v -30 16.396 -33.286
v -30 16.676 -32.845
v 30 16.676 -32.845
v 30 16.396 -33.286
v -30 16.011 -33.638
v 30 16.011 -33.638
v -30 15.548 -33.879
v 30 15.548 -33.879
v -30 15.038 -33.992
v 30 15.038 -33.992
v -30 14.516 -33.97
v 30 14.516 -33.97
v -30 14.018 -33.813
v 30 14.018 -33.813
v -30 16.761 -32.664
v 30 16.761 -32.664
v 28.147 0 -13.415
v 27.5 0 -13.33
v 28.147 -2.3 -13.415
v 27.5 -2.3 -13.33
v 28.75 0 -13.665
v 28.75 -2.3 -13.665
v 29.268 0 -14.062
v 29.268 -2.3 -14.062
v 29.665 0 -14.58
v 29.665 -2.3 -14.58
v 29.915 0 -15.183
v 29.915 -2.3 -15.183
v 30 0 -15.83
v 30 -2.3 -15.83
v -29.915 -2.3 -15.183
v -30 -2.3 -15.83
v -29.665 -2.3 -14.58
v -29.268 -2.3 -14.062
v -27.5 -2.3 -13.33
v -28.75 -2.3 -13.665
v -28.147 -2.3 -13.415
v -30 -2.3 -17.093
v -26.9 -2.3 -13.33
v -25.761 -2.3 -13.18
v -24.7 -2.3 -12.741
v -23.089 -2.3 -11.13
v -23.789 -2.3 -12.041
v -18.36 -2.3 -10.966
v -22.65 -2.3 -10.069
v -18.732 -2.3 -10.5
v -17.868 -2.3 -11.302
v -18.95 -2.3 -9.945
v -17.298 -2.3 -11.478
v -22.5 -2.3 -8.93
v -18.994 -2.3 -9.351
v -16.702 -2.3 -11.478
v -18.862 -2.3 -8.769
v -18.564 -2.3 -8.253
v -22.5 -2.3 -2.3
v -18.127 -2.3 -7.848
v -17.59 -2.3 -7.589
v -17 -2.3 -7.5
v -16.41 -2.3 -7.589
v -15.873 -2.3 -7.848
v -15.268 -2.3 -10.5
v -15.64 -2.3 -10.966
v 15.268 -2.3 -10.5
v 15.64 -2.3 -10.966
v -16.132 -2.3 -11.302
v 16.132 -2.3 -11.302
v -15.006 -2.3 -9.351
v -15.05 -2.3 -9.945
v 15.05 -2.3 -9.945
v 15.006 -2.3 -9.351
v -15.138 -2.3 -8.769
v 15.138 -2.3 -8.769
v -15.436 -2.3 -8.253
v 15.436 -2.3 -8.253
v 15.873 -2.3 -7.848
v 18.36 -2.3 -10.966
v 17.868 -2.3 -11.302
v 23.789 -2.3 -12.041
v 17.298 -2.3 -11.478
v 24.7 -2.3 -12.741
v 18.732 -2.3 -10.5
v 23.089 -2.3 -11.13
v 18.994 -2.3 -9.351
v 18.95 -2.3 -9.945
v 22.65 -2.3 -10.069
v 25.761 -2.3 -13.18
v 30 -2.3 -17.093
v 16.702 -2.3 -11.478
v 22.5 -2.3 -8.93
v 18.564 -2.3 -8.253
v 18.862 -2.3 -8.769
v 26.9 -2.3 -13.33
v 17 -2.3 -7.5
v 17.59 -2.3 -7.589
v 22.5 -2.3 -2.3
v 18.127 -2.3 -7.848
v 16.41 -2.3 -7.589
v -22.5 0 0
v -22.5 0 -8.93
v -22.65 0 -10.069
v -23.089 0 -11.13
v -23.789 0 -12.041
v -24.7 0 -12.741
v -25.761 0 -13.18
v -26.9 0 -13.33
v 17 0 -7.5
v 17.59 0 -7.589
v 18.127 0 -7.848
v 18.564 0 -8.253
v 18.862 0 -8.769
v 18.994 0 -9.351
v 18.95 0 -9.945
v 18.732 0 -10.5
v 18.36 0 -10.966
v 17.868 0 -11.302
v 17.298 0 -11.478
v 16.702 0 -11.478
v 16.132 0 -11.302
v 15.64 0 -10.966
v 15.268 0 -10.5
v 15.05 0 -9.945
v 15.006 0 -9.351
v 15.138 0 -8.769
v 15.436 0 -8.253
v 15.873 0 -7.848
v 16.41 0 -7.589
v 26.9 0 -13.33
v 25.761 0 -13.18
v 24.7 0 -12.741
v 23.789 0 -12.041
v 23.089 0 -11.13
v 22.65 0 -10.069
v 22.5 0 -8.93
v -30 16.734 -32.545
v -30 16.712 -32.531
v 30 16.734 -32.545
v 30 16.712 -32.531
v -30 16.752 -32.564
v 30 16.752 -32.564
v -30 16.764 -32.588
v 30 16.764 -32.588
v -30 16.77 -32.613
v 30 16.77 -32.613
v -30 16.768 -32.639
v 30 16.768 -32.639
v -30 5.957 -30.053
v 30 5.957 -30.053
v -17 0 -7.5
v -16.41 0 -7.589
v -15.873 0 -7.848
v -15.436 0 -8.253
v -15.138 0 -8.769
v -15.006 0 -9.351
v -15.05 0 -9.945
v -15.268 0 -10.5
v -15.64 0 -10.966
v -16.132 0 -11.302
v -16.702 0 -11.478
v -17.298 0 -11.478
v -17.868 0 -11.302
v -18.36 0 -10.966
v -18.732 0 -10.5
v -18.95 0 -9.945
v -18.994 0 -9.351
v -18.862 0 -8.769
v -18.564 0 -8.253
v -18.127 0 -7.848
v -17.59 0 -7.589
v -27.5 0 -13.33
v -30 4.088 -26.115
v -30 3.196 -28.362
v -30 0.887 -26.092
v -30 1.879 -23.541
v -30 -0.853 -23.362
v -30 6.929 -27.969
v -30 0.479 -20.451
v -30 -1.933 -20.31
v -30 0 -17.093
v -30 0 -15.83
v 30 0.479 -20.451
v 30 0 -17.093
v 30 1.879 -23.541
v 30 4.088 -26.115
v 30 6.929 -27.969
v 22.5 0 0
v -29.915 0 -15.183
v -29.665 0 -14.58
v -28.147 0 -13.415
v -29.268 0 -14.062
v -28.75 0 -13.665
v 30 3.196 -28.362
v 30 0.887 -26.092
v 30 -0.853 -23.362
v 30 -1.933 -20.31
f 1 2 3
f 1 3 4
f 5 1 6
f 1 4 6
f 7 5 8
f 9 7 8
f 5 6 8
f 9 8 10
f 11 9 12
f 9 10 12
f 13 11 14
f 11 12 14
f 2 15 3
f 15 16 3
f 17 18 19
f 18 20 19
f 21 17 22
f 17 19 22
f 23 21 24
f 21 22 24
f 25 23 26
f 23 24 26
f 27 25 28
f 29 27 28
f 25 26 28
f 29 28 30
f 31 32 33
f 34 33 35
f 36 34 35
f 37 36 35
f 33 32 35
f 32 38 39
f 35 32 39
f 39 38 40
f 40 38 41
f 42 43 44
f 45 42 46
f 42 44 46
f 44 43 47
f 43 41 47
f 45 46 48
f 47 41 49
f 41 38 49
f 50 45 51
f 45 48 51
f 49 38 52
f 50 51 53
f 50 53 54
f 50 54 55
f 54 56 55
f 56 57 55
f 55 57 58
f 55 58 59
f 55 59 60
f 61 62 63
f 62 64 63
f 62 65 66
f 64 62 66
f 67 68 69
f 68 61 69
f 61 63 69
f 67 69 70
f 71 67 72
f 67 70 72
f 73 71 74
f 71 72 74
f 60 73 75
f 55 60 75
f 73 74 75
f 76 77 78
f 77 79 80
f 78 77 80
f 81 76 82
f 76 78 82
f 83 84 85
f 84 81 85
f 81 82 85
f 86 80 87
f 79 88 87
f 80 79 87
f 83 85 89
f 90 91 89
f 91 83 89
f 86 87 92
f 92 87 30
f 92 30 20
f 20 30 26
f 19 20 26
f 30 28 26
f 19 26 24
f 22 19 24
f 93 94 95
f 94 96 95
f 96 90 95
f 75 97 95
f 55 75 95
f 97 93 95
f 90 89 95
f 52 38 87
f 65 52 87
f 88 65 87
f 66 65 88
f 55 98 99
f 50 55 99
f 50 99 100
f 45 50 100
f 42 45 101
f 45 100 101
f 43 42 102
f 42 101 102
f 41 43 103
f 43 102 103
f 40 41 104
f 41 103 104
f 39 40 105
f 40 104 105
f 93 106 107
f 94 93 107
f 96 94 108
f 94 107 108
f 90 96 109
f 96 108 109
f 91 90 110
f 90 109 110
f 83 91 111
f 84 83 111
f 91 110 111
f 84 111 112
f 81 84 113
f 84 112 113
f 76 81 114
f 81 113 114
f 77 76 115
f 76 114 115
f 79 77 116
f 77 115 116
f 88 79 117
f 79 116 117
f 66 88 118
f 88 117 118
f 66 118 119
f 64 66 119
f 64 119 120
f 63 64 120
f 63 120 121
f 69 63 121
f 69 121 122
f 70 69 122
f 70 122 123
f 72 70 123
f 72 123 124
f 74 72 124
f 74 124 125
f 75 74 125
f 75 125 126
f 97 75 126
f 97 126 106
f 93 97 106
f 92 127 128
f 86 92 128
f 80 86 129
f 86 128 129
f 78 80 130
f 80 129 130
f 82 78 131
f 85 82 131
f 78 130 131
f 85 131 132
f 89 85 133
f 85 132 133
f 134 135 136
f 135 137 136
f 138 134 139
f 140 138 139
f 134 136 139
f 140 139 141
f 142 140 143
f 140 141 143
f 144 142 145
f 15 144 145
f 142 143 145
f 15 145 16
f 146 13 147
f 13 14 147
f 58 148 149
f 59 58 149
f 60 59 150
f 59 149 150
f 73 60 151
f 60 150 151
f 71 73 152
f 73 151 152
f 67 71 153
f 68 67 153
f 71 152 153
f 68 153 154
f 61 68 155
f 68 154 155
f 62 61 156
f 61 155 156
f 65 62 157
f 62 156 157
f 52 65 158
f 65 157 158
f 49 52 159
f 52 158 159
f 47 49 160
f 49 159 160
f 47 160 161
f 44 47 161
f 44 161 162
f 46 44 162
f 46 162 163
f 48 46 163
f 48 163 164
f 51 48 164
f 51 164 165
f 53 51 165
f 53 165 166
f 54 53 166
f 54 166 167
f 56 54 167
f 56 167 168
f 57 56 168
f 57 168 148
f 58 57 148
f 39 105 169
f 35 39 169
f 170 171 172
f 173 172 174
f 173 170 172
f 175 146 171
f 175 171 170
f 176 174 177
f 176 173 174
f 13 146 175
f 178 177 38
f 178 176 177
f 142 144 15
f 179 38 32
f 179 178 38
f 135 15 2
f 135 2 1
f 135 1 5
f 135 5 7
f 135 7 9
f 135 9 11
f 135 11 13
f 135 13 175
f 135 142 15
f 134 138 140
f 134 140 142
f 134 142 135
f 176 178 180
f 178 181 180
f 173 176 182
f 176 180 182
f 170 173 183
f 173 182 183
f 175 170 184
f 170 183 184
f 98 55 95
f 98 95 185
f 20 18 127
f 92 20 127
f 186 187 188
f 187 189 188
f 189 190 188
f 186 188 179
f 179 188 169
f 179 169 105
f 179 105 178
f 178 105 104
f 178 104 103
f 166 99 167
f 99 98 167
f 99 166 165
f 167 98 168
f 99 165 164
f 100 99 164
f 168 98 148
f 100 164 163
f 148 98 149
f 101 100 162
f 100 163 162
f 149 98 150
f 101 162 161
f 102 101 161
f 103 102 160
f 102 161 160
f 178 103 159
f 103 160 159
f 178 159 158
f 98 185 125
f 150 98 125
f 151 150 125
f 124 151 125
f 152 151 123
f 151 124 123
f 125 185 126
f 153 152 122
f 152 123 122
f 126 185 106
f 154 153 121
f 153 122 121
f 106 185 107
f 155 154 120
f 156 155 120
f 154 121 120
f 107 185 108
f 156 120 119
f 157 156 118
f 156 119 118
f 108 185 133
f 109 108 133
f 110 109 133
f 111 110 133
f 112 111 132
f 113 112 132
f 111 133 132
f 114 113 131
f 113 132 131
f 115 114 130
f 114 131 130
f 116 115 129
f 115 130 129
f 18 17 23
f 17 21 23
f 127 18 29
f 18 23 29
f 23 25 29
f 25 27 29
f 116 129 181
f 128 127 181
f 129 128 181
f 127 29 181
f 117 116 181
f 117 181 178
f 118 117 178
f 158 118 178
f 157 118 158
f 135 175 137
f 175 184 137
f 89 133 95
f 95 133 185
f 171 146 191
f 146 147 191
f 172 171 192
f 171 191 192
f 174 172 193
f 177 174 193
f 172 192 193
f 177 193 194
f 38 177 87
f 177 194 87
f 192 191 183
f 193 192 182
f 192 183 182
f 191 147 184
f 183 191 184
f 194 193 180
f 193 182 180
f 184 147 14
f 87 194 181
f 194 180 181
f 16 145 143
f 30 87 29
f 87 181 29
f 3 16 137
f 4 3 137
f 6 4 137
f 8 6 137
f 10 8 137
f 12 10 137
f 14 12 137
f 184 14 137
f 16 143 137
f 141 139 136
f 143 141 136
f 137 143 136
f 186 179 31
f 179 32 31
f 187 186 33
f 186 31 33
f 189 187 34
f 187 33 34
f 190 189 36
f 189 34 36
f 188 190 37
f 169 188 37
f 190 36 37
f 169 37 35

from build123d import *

# Parameters (mm, degrees)
BOSS_EXTRUDE1_DEPTH = 30
SKETCH3_R           = 2
CUT_EXTRUDE1_DEPTH  = 49.344936653
FILLET1_R           = 2.5


with BuildPart() as part:
    # Sketch2 → Boss-Extrude1 (new, symmetric)
    with BuildSketch(Plane(origin=(0, 0, 0), x_dir=(0, 0, -1), z_dir=(1, 0, 0))):
        with BuildLine():
            Line((0, 0), (17.093183557, 0))
            ThreePointArc((17.093183557, 0), (23.540778857, 1.87930265), (27.968877001, 6.928580859))
            Line((27.968877001, 6.928580859), (32.531082361, 16.712261826))
            ThreePointArc((32.531082361, 16.712261826), (32.587511126, 16.763969262), (32.663974966, 16.760630779))
            Line((32.663974966, 16.760630779), (32.845236523, 16.676107126))
            ThreePointArc((32.845236523, 16.676107126), (33.879385242, 15.547531839), (33.812615574, 14.018255029))
            Line((33.812615574, 14.018255029), (30.053384911, 5.956558857))
            ThreePointArc((30.053384911, 5.956558857), (24.776567956, -0.060497675), (17.093183557, -2.3))
            Line((17.093183557, -2.3), (2.3, -2.3))
            Line((2.3, -2.3), (0, 0))
        make_face()
    extrude(amount=BOSS_EXTRUDE1_DEPTH, both=True)

    # Sketch3 → Cut-Extrude1 (cut, through all)
    with BuildSketch(Plane(origin=(0, 0, 0), x_dir=(1, 0, 0), z_dir=(0, 1, 0))):
        with BuildLine():
            Line((-26.9, 13.33), (-30, 13.33))
            Line((-30, 13.33), (-30, 0))
            Line((-30, 0), (-22.5, 0))
            Line((-22.5, 0), (-22.5, 8.93))
            ThreePointArc((-22.5, 8.93), (-23.788730163, 12.041269837), (-26.9, 13.33))
        make_face()
        with Locations(Location((-17, 9.5, 0), (0, 0, 270))):
            Circle(SKETCH3_R)
        with Locations(Location((17, 9.5, 0), (0, 0, 270))):
            Circle(SKETCH3_R)
        with BuildLine():
            Line((30, 0), (30, 13.33))
            Line((30, 13.33), (26.9, 13.33))
            ThreePointArc((26.9, 13.33), (23.788730163, 12.041269837), (22.5, 8.93))
            Line((22.5, 8.93), (22.5, 0))
            Line((22.5, 0), (30, 0))
        make_face()
    extrude(amount=-CUT_EXTRUDE1_DEPTH, mode=Mode.SUBTRACT)

    # Fillet1
    fillet1_edges = [part.edges().sort_by_distance(p)[0] for p in [
        (-30, -1.15, -13.33),
        (30, -1.15, -13.33),
    ]]
    fillet(fillet1_edges, radius=FILLET1_R)


solid = part.part
